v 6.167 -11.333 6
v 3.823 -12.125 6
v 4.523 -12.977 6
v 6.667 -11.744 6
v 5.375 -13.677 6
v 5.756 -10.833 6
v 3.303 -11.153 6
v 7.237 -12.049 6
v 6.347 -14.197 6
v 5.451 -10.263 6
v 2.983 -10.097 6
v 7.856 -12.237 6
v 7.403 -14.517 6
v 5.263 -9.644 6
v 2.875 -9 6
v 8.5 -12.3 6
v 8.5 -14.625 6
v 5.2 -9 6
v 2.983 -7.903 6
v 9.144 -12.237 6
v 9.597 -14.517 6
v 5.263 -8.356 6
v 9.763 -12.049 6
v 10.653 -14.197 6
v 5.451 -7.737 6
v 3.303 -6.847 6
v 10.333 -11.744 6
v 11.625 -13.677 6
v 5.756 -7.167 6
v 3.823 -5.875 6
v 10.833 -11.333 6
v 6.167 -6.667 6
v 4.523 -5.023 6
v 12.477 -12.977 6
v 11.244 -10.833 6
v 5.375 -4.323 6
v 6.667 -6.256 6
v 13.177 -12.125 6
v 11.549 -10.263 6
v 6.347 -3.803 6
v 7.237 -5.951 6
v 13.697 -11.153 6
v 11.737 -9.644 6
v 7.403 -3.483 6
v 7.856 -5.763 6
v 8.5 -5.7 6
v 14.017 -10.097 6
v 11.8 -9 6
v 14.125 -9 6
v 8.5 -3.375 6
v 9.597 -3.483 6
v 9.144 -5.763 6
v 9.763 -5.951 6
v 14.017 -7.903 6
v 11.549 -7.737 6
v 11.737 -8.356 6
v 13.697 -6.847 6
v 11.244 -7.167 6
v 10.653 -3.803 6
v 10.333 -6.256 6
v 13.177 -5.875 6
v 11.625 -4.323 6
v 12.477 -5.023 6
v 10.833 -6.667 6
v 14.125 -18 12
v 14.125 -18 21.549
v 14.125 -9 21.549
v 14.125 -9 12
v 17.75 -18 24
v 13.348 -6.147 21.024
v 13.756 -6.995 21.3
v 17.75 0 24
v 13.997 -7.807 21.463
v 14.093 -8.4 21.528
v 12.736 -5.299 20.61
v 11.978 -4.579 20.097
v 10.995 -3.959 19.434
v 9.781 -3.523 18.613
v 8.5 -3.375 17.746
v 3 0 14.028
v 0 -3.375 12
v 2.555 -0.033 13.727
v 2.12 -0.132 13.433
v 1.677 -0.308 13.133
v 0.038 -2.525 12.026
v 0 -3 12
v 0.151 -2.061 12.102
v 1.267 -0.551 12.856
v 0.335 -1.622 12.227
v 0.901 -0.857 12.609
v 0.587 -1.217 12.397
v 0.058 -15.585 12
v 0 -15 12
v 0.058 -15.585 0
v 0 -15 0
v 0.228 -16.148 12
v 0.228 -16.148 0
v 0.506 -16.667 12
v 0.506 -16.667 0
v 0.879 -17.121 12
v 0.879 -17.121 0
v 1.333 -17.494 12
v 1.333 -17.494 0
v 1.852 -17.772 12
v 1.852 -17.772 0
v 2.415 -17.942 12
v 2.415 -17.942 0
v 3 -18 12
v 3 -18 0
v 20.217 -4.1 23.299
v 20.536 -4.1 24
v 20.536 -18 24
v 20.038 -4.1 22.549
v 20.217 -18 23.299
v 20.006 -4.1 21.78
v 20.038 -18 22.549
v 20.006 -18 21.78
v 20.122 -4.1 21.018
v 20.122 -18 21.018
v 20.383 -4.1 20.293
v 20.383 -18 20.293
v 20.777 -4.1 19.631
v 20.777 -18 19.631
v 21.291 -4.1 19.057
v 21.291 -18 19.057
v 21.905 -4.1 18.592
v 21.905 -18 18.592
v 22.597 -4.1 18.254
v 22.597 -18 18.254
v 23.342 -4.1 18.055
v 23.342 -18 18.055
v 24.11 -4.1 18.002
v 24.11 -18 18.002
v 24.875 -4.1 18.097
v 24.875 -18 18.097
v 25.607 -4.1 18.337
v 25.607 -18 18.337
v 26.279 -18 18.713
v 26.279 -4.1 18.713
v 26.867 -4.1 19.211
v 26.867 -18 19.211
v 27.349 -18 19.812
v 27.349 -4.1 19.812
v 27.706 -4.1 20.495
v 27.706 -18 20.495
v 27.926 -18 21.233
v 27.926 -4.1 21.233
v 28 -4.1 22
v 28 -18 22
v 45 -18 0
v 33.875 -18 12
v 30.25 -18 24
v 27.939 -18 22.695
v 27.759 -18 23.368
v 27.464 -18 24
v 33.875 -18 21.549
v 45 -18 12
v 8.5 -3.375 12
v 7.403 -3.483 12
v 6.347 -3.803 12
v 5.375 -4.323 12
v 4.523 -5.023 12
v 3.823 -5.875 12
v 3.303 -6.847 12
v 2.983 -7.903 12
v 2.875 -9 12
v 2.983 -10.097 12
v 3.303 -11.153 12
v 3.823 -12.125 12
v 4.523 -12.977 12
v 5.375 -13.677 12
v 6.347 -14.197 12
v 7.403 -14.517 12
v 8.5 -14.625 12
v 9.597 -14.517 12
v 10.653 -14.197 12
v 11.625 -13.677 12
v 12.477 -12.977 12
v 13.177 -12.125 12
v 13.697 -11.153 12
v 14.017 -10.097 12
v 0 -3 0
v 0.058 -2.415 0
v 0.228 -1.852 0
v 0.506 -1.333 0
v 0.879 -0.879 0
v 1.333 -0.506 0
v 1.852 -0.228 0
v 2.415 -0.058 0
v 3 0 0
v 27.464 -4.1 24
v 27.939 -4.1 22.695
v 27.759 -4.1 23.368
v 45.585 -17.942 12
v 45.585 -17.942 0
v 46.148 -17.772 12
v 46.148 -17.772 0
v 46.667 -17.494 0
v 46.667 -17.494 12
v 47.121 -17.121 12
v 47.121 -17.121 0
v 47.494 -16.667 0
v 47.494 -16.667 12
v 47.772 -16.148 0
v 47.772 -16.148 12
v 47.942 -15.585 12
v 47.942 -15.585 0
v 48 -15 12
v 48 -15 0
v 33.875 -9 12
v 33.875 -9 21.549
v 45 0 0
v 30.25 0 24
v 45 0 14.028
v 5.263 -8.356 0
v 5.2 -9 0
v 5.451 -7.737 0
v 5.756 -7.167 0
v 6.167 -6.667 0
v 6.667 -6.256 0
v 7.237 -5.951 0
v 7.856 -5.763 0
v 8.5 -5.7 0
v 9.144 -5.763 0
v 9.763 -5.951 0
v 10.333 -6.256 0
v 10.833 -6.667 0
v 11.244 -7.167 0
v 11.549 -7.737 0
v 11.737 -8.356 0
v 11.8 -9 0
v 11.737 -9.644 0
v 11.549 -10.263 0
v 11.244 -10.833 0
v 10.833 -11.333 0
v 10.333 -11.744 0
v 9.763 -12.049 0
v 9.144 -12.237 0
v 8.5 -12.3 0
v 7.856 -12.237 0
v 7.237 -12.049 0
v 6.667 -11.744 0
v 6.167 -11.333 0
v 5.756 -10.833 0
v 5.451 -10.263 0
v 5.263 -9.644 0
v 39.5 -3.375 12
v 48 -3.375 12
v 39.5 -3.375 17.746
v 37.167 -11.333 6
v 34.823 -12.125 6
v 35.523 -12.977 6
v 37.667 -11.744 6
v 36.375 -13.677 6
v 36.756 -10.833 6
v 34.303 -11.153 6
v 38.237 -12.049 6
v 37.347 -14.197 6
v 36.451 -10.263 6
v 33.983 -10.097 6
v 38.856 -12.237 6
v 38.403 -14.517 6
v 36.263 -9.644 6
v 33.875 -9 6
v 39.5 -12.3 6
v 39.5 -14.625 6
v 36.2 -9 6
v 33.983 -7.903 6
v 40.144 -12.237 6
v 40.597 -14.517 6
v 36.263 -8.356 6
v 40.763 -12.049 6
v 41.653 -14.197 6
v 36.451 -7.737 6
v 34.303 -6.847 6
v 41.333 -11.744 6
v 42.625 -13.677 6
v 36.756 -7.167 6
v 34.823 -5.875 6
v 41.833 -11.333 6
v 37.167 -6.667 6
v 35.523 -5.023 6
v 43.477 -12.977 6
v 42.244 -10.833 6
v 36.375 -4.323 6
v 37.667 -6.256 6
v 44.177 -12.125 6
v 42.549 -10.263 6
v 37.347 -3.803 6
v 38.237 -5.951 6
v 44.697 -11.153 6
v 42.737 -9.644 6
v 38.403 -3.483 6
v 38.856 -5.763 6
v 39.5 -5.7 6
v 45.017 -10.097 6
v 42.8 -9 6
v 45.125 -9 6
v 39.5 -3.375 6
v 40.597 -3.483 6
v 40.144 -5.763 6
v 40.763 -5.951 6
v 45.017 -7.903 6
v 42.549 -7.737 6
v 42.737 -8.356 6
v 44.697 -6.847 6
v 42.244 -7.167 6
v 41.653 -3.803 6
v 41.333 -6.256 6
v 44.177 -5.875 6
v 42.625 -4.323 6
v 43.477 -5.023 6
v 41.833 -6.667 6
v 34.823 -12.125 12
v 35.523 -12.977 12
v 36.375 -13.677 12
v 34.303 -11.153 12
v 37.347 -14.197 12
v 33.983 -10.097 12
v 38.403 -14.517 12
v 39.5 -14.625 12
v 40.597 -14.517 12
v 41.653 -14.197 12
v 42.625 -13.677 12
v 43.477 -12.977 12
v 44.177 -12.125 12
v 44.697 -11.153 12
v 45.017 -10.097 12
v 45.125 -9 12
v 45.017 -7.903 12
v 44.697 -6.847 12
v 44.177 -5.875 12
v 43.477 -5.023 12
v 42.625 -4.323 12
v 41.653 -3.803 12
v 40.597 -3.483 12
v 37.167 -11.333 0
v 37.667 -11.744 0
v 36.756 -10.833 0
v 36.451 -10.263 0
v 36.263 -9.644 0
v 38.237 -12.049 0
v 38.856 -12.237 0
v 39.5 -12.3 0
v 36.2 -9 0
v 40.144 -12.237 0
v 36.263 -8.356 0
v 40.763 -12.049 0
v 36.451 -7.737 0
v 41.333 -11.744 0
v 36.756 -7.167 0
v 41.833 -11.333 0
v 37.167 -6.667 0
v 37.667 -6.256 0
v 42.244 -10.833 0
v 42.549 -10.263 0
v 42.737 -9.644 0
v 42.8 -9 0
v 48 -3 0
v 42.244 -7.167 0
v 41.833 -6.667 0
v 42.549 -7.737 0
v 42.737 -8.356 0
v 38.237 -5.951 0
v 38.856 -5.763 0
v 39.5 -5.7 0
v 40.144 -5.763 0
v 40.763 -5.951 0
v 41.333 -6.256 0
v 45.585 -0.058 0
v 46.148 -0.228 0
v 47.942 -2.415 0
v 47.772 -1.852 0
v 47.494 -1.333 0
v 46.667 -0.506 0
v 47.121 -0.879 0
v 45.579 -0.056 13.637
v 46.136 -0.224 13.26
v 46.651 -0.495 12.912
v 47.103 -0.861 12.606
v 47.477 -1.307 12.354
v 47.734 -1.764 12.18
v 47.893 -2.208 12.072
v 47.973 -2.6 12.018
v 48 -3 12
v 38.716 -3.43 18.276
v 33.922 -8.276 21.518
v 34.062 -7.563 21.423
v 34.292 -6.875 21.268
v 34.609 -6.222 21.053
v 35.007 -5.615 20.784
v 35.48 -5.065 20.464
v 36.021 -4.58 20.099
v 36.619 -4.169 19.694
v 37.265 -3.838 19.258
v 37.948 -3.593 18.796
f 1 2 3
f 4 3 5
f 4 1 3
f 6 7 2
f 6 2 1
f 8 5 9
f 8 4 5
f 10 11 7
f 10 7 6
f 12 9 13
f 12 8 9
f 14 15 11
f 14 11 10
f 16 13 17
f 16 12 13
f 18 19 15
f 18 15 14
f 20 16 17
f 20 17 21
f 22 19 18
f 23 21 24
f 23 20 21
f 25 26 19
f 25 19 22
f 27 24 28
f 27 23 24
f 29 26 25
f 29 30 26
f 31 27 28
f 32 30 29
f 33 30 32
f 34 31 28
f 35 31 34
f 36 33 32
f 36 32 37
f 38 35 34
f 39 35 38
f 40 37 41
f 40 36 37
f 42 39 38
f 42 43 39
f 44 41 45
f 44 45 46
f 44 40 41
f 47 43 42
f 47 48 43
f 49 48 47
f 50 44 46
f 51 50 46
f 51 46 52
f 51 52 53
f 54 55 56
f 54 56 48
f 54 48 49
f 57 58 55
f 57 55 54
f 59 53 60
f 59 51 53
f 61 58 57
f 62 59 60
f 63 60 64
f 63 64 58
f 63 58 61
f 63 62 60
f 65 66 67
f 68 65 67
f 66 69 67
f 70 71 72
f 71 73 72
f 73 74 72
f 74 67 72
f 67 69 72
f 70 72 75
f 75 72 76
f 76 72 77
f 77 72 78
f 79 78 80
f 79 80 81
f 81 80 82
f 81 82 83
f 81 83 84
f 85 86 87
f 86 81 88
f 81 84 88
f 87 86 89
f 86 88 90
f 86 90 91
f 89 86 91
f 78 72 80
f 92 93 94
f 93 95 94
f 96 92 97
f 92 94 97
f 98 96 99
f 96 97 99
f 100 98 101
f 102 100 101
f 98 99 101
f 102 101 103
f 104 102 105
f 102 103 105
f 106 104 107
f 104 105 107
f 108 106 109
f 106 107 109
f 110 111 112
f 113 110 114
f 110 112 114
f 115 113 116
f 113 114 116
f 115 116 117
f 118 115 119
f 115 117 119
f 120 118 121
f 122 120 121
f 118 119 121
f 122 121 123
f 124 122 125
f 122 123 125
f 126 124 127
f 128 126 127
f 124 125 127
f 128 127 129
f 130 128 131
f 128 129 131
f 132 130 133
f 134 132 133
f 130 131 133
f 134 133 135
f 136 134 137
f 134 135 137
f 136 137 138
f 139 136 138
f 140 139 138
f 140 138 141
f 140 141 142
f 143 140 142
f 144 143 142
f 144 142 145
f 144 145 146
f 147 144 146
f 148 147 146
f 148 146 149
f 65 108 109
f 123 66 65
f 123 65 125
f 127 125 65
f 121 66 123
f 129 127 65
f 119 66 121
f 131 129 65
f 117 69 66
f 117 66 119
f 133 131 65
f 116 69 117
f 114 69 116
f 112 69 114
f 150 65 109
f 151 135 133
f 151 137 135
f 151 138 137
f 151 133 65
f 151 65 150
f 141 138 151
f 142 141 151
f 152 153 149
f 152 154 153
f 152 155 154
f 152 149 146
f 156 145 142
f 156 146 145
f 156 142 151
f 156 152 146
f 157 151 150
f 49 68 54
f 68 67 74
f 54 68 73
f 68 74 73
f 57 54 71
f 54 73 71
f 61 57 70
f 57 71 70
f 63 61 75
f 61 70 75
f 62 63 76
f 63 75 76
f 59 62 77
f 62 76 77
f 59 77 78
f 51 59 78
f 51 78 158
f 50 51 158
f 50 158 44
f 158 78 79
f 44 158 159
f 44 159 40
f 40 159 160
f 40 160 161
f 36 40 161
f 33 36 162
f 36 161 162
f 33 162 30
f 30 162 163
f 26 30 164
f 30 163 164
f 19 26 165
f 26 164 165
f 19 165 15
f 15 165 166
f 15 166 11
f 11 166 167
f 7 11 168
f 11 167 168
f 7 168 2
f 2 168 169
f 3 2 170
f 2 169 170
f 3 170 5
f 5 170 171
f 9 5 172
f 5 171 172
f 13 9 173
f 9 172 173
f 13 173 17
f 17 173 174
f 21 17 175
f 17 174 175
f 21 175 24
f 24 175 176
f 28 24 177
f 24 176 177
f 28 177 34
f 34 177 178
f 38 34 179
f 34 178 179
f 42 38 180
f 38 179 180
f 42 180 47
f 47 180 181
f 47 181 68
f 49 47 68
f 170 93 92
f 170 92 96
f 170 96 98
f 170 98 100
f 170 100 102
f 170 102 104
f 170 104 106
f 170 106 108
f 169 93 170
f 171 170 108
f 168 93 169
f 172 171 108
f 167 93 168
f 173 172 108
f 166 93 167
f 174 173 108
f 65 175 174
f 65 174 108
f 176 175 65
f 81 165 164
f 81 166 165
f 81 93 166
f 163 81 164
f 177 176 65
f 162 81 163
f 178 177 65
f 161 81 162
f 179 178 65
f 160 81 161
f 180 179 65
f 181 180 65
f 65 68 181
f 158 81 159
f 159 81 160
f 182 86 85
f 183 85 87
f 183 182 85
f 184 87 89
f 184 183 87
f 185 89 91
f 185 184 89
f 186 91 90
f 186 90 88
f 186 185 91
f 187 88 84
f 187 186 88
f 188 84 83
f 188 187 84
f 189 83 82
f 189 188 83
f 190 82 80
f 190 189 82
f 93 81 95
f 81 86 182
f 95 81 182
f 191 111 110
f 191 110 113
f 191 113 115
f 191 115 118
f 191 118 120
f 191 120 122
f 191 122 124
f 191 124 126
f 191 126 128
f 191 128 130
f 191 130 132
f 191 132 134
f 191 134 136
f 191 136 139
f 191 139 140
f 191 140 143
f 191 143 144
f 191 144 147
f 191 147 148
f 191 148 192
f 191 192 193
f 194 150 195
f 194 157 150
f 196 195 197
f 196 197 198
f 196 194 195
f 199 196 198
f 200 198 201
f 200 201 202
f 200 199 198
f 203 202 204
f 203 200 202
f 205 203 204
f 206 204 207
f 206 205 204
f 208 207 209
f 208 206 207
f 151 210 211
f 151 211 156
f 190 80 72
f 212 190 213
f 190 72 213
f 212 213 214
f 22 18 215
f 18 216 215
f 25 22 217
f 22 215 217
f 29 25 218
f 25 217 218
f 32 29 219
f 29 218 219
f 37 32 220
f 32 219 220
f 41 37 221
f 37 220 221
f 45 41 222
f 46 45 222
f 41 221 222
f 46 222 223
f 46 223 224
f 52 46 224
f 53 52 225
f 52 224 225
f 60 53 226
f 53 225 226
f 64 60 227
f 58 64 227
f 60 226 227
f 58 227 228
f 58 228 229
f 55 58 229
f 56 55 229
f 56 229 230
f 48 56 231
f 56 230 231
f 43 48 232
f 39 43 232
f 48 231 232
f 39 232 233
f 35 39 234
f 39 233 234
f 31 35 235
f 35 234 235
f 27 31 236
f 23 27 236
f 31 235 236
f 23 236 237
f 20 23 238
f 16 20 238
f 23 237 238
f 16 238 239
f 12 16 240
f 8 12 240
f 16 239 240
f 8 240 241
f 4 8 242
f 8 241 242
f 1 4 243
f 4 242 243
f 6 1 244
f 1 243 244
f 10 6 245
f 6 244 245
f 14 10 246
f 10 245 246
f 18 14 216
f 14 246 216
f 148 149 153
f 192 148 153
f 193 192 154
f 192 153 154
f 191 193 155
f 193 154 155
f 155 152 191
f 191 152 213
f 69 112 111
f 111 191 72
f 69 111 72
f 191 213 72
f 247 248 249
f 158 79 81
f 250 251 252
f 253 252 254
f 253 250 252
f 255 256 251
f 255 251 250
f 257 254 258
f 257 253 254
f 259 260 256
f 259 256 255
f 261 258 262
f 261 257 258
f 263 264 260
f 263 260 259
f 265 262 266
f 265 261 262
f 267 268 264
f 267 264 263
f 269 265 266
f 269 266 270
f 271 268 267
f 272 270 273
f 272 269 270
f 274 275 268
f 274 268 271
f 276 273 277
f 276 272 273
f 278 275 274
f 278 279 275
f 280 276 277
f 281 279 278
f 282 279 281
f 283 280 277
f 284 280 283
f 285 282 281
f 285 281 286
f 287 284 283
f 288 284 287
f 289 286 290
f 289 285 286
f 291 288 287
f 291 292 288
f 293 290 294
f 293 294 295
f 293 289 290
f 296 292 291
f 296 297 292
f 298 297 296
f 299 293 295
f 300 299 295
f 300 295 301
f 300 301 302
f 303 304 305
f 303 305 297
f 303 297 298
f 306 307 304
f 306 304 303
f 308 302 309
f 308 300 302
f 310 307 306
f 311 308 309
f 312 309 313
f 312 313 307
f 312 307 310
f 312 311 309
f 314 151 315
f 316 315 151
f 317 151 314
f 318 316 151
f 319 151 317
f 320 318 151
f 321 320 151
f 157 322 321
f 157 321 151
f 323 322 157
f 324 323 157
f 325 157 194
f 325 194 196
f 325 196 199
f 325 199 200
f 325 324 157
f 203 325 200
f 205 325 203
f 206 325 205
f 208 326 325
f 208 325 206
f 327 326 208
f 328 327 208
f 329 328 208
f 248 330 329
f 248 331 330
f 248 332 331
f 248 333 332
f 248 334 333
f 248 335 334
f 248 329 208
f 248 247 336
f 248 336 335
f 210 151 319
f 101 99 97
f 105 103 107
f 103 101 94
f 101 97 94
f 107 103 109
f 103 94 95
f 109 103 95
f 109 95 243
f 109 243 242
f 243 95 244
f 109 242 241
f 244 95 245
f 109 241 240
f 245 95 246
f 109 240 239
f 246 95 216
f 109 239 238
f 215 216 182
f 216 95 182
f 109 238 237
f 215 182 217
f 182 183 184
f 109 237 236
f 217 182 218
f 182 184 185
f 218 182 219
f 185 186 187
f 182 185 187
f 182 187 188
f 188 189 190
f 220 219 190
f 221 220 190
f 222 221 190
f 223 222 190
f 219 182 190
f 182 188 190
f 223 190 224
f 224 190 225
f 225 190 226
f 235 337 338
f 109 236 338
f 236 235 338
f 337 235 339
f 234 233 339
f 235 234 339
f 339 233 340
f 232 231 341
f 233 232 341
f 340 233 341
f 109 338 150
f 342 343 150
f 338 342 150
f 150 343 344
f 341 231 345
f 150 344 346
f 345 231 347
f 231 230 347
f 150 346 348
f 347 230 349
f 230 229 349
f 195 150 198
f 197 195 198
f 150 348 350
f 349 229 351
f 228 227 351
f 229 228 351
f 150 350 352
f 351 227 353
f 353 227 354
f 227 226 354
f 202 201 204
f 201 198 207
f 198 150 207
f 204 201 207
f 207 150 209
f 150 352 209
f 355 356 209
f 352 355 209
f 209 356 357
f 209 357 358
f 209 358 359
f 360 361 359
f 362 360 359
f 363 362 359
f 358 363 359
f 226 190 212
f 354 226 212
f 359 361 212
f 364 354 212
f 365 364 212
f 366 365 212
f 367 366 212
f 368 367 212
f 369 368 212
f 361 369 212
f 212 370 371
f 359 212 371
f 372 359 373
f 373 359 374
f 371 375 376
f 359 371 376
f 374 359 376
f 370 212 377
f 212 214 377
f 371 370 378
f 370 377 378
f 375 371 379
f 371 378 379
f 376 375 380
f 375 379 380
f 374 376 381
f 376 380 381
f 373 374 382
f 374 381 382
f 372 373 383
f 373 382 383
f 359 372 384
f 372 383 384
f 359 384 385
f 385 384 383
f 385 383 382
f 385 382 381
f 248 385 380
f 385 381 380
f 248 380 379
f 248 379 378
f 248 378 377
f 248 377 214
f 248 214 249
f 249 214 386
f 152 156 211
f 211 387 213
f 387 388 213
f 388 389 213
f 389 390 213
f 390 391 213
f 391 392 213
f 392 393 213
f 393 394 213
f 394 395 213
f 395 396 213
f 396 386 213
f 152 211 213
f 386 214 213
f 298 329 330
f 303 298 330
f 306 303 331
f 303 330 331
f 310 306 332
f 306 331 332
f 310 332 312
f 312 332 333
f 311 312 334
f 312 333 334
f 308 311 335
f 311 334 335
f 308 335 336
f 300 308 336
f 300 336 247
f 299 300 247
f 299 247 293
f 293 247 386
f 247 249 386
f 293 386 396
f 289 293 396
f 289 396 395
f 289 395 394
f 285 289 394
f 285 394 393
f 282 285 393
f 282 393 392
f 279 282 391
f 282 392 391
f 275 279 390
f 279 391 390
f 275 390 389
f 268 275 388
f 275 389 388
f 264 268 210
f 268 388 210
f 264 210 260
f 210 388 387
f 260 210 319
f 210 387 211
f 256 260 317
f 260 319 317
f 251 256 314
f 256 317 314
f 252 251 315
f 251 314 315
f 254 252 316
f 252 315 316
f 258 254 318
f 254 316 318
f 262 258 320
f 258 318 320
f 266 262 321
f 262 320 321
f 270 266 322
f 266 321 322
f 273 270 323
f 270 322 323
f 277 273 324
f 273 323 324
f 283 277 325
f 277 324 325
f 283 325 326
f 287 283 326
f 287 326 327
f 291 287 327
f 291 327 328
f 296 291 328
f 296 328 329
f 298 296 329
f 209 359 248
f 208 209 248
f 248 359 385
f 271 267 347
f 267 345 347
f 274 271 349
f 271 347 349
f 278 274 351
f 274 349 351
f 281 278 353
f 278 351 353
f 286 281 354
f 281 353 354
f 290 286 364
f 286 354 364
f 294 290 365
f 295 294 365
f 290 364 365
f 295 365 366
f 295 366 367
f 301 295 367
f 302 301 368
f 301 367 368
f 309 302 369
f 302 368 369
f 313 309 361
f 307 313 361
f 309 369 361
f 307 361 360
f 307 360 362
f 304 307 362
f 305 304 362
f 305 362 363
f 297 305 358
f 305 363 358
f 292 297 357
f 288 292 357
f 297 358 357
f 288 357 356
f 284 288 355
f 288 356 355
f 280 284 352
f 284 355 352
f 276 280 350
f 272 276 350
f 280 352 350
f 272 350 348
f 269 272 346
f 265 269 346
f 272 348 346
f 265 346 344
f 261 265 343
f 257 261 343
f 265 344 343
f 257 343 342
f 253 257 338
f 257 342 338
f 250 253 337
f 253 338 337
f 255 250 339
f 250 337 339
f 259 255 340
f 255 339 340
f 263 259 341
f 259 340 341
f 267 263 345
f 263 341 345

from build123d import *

# Parameters (mm, degrees)
F1_DEPTH       = 18
F3_DEPTH       = 13.9
F5_DEPTH       = 12
F7_D           = 6.6
F7_CBORE_D     = 11.25
F7_CBORE_DEPTH = 6
F8_R           = 3


with BuildPart() as f1:
    # F0 (on Front) → F1 (new body)
    with BuildSketch(Plane.XZ):
        Polygon((0, 12), (0, 0), (48, 0), (48, 12), (30.25, 24), (17.75, 24), align=None)
    extrude(amount=F1_DEPTH)

    # F2 (on face) → F3 (cut)
    with BuildSketch(Plane.XZ.offset(18)):
        with BuildLine():
            ThreePointArc((20.5358983849, 24), (22.9647238196, 18.1362966948), (28, 22))
            ThreePointArc((28, 22), (27.8637033052, 23.0352761804), (27.4641016151, 24))
            Line((27.4641016151, 24), (20.5358983849, 24))
        make_face()
    extrude(amount=-F3_DEPTH, mode=Mode.SUBTRACT)

    # F4 (on face) → F5 (cut)
    with BuildSketch(Plane.XY.offset(24)):
        with BuildLine():
            Line((8.5, -3.375), (0, -3.375))
            Line((0, -3.375), (0, -18))
            Line((0, -18), (14.125, -18))
            Line((14.125, -18), (14.125, -9))
            ThreePointArc((14.125, -9), (12.4774756442, -5.0225243558), (8.5, -3.375))
        make_face()
        with BuildLine():
            ThreePointArc((39.5, -3.375), (35.5225243558, -5.0225243558), (33.875, -9))
            Line((33.875, -9), (33.875, -18))
            Line((33.875, -18), (48, -18))
            Line((48, -18), (48, -3.375))
            Line((48, -3.375), (39.5, -3.375))
        make_face()
    extrude(amount=-F5_DEPTH, mode=Mode.SUBTRACT)

    # F7 (through all)
    with Locations(Plane.XY.offset(12)):
        with Locations((8.5, -9), (39.5, -9)):
            CounterBoreHole(F7_D / 2, F7_CBORE_D / 2, F7_CBORE_DEPTH)

    # F8
    f8_edges = [f1.edges().sort_by_distance(p)[0] for p in [
        (0, 0, 6),
        (0, -18, 6),
        (48, -18, 6),
        (48, 0, 6),
    ]]
    fillet(f8_edges, radius=F8_R)


solid = f1.part
